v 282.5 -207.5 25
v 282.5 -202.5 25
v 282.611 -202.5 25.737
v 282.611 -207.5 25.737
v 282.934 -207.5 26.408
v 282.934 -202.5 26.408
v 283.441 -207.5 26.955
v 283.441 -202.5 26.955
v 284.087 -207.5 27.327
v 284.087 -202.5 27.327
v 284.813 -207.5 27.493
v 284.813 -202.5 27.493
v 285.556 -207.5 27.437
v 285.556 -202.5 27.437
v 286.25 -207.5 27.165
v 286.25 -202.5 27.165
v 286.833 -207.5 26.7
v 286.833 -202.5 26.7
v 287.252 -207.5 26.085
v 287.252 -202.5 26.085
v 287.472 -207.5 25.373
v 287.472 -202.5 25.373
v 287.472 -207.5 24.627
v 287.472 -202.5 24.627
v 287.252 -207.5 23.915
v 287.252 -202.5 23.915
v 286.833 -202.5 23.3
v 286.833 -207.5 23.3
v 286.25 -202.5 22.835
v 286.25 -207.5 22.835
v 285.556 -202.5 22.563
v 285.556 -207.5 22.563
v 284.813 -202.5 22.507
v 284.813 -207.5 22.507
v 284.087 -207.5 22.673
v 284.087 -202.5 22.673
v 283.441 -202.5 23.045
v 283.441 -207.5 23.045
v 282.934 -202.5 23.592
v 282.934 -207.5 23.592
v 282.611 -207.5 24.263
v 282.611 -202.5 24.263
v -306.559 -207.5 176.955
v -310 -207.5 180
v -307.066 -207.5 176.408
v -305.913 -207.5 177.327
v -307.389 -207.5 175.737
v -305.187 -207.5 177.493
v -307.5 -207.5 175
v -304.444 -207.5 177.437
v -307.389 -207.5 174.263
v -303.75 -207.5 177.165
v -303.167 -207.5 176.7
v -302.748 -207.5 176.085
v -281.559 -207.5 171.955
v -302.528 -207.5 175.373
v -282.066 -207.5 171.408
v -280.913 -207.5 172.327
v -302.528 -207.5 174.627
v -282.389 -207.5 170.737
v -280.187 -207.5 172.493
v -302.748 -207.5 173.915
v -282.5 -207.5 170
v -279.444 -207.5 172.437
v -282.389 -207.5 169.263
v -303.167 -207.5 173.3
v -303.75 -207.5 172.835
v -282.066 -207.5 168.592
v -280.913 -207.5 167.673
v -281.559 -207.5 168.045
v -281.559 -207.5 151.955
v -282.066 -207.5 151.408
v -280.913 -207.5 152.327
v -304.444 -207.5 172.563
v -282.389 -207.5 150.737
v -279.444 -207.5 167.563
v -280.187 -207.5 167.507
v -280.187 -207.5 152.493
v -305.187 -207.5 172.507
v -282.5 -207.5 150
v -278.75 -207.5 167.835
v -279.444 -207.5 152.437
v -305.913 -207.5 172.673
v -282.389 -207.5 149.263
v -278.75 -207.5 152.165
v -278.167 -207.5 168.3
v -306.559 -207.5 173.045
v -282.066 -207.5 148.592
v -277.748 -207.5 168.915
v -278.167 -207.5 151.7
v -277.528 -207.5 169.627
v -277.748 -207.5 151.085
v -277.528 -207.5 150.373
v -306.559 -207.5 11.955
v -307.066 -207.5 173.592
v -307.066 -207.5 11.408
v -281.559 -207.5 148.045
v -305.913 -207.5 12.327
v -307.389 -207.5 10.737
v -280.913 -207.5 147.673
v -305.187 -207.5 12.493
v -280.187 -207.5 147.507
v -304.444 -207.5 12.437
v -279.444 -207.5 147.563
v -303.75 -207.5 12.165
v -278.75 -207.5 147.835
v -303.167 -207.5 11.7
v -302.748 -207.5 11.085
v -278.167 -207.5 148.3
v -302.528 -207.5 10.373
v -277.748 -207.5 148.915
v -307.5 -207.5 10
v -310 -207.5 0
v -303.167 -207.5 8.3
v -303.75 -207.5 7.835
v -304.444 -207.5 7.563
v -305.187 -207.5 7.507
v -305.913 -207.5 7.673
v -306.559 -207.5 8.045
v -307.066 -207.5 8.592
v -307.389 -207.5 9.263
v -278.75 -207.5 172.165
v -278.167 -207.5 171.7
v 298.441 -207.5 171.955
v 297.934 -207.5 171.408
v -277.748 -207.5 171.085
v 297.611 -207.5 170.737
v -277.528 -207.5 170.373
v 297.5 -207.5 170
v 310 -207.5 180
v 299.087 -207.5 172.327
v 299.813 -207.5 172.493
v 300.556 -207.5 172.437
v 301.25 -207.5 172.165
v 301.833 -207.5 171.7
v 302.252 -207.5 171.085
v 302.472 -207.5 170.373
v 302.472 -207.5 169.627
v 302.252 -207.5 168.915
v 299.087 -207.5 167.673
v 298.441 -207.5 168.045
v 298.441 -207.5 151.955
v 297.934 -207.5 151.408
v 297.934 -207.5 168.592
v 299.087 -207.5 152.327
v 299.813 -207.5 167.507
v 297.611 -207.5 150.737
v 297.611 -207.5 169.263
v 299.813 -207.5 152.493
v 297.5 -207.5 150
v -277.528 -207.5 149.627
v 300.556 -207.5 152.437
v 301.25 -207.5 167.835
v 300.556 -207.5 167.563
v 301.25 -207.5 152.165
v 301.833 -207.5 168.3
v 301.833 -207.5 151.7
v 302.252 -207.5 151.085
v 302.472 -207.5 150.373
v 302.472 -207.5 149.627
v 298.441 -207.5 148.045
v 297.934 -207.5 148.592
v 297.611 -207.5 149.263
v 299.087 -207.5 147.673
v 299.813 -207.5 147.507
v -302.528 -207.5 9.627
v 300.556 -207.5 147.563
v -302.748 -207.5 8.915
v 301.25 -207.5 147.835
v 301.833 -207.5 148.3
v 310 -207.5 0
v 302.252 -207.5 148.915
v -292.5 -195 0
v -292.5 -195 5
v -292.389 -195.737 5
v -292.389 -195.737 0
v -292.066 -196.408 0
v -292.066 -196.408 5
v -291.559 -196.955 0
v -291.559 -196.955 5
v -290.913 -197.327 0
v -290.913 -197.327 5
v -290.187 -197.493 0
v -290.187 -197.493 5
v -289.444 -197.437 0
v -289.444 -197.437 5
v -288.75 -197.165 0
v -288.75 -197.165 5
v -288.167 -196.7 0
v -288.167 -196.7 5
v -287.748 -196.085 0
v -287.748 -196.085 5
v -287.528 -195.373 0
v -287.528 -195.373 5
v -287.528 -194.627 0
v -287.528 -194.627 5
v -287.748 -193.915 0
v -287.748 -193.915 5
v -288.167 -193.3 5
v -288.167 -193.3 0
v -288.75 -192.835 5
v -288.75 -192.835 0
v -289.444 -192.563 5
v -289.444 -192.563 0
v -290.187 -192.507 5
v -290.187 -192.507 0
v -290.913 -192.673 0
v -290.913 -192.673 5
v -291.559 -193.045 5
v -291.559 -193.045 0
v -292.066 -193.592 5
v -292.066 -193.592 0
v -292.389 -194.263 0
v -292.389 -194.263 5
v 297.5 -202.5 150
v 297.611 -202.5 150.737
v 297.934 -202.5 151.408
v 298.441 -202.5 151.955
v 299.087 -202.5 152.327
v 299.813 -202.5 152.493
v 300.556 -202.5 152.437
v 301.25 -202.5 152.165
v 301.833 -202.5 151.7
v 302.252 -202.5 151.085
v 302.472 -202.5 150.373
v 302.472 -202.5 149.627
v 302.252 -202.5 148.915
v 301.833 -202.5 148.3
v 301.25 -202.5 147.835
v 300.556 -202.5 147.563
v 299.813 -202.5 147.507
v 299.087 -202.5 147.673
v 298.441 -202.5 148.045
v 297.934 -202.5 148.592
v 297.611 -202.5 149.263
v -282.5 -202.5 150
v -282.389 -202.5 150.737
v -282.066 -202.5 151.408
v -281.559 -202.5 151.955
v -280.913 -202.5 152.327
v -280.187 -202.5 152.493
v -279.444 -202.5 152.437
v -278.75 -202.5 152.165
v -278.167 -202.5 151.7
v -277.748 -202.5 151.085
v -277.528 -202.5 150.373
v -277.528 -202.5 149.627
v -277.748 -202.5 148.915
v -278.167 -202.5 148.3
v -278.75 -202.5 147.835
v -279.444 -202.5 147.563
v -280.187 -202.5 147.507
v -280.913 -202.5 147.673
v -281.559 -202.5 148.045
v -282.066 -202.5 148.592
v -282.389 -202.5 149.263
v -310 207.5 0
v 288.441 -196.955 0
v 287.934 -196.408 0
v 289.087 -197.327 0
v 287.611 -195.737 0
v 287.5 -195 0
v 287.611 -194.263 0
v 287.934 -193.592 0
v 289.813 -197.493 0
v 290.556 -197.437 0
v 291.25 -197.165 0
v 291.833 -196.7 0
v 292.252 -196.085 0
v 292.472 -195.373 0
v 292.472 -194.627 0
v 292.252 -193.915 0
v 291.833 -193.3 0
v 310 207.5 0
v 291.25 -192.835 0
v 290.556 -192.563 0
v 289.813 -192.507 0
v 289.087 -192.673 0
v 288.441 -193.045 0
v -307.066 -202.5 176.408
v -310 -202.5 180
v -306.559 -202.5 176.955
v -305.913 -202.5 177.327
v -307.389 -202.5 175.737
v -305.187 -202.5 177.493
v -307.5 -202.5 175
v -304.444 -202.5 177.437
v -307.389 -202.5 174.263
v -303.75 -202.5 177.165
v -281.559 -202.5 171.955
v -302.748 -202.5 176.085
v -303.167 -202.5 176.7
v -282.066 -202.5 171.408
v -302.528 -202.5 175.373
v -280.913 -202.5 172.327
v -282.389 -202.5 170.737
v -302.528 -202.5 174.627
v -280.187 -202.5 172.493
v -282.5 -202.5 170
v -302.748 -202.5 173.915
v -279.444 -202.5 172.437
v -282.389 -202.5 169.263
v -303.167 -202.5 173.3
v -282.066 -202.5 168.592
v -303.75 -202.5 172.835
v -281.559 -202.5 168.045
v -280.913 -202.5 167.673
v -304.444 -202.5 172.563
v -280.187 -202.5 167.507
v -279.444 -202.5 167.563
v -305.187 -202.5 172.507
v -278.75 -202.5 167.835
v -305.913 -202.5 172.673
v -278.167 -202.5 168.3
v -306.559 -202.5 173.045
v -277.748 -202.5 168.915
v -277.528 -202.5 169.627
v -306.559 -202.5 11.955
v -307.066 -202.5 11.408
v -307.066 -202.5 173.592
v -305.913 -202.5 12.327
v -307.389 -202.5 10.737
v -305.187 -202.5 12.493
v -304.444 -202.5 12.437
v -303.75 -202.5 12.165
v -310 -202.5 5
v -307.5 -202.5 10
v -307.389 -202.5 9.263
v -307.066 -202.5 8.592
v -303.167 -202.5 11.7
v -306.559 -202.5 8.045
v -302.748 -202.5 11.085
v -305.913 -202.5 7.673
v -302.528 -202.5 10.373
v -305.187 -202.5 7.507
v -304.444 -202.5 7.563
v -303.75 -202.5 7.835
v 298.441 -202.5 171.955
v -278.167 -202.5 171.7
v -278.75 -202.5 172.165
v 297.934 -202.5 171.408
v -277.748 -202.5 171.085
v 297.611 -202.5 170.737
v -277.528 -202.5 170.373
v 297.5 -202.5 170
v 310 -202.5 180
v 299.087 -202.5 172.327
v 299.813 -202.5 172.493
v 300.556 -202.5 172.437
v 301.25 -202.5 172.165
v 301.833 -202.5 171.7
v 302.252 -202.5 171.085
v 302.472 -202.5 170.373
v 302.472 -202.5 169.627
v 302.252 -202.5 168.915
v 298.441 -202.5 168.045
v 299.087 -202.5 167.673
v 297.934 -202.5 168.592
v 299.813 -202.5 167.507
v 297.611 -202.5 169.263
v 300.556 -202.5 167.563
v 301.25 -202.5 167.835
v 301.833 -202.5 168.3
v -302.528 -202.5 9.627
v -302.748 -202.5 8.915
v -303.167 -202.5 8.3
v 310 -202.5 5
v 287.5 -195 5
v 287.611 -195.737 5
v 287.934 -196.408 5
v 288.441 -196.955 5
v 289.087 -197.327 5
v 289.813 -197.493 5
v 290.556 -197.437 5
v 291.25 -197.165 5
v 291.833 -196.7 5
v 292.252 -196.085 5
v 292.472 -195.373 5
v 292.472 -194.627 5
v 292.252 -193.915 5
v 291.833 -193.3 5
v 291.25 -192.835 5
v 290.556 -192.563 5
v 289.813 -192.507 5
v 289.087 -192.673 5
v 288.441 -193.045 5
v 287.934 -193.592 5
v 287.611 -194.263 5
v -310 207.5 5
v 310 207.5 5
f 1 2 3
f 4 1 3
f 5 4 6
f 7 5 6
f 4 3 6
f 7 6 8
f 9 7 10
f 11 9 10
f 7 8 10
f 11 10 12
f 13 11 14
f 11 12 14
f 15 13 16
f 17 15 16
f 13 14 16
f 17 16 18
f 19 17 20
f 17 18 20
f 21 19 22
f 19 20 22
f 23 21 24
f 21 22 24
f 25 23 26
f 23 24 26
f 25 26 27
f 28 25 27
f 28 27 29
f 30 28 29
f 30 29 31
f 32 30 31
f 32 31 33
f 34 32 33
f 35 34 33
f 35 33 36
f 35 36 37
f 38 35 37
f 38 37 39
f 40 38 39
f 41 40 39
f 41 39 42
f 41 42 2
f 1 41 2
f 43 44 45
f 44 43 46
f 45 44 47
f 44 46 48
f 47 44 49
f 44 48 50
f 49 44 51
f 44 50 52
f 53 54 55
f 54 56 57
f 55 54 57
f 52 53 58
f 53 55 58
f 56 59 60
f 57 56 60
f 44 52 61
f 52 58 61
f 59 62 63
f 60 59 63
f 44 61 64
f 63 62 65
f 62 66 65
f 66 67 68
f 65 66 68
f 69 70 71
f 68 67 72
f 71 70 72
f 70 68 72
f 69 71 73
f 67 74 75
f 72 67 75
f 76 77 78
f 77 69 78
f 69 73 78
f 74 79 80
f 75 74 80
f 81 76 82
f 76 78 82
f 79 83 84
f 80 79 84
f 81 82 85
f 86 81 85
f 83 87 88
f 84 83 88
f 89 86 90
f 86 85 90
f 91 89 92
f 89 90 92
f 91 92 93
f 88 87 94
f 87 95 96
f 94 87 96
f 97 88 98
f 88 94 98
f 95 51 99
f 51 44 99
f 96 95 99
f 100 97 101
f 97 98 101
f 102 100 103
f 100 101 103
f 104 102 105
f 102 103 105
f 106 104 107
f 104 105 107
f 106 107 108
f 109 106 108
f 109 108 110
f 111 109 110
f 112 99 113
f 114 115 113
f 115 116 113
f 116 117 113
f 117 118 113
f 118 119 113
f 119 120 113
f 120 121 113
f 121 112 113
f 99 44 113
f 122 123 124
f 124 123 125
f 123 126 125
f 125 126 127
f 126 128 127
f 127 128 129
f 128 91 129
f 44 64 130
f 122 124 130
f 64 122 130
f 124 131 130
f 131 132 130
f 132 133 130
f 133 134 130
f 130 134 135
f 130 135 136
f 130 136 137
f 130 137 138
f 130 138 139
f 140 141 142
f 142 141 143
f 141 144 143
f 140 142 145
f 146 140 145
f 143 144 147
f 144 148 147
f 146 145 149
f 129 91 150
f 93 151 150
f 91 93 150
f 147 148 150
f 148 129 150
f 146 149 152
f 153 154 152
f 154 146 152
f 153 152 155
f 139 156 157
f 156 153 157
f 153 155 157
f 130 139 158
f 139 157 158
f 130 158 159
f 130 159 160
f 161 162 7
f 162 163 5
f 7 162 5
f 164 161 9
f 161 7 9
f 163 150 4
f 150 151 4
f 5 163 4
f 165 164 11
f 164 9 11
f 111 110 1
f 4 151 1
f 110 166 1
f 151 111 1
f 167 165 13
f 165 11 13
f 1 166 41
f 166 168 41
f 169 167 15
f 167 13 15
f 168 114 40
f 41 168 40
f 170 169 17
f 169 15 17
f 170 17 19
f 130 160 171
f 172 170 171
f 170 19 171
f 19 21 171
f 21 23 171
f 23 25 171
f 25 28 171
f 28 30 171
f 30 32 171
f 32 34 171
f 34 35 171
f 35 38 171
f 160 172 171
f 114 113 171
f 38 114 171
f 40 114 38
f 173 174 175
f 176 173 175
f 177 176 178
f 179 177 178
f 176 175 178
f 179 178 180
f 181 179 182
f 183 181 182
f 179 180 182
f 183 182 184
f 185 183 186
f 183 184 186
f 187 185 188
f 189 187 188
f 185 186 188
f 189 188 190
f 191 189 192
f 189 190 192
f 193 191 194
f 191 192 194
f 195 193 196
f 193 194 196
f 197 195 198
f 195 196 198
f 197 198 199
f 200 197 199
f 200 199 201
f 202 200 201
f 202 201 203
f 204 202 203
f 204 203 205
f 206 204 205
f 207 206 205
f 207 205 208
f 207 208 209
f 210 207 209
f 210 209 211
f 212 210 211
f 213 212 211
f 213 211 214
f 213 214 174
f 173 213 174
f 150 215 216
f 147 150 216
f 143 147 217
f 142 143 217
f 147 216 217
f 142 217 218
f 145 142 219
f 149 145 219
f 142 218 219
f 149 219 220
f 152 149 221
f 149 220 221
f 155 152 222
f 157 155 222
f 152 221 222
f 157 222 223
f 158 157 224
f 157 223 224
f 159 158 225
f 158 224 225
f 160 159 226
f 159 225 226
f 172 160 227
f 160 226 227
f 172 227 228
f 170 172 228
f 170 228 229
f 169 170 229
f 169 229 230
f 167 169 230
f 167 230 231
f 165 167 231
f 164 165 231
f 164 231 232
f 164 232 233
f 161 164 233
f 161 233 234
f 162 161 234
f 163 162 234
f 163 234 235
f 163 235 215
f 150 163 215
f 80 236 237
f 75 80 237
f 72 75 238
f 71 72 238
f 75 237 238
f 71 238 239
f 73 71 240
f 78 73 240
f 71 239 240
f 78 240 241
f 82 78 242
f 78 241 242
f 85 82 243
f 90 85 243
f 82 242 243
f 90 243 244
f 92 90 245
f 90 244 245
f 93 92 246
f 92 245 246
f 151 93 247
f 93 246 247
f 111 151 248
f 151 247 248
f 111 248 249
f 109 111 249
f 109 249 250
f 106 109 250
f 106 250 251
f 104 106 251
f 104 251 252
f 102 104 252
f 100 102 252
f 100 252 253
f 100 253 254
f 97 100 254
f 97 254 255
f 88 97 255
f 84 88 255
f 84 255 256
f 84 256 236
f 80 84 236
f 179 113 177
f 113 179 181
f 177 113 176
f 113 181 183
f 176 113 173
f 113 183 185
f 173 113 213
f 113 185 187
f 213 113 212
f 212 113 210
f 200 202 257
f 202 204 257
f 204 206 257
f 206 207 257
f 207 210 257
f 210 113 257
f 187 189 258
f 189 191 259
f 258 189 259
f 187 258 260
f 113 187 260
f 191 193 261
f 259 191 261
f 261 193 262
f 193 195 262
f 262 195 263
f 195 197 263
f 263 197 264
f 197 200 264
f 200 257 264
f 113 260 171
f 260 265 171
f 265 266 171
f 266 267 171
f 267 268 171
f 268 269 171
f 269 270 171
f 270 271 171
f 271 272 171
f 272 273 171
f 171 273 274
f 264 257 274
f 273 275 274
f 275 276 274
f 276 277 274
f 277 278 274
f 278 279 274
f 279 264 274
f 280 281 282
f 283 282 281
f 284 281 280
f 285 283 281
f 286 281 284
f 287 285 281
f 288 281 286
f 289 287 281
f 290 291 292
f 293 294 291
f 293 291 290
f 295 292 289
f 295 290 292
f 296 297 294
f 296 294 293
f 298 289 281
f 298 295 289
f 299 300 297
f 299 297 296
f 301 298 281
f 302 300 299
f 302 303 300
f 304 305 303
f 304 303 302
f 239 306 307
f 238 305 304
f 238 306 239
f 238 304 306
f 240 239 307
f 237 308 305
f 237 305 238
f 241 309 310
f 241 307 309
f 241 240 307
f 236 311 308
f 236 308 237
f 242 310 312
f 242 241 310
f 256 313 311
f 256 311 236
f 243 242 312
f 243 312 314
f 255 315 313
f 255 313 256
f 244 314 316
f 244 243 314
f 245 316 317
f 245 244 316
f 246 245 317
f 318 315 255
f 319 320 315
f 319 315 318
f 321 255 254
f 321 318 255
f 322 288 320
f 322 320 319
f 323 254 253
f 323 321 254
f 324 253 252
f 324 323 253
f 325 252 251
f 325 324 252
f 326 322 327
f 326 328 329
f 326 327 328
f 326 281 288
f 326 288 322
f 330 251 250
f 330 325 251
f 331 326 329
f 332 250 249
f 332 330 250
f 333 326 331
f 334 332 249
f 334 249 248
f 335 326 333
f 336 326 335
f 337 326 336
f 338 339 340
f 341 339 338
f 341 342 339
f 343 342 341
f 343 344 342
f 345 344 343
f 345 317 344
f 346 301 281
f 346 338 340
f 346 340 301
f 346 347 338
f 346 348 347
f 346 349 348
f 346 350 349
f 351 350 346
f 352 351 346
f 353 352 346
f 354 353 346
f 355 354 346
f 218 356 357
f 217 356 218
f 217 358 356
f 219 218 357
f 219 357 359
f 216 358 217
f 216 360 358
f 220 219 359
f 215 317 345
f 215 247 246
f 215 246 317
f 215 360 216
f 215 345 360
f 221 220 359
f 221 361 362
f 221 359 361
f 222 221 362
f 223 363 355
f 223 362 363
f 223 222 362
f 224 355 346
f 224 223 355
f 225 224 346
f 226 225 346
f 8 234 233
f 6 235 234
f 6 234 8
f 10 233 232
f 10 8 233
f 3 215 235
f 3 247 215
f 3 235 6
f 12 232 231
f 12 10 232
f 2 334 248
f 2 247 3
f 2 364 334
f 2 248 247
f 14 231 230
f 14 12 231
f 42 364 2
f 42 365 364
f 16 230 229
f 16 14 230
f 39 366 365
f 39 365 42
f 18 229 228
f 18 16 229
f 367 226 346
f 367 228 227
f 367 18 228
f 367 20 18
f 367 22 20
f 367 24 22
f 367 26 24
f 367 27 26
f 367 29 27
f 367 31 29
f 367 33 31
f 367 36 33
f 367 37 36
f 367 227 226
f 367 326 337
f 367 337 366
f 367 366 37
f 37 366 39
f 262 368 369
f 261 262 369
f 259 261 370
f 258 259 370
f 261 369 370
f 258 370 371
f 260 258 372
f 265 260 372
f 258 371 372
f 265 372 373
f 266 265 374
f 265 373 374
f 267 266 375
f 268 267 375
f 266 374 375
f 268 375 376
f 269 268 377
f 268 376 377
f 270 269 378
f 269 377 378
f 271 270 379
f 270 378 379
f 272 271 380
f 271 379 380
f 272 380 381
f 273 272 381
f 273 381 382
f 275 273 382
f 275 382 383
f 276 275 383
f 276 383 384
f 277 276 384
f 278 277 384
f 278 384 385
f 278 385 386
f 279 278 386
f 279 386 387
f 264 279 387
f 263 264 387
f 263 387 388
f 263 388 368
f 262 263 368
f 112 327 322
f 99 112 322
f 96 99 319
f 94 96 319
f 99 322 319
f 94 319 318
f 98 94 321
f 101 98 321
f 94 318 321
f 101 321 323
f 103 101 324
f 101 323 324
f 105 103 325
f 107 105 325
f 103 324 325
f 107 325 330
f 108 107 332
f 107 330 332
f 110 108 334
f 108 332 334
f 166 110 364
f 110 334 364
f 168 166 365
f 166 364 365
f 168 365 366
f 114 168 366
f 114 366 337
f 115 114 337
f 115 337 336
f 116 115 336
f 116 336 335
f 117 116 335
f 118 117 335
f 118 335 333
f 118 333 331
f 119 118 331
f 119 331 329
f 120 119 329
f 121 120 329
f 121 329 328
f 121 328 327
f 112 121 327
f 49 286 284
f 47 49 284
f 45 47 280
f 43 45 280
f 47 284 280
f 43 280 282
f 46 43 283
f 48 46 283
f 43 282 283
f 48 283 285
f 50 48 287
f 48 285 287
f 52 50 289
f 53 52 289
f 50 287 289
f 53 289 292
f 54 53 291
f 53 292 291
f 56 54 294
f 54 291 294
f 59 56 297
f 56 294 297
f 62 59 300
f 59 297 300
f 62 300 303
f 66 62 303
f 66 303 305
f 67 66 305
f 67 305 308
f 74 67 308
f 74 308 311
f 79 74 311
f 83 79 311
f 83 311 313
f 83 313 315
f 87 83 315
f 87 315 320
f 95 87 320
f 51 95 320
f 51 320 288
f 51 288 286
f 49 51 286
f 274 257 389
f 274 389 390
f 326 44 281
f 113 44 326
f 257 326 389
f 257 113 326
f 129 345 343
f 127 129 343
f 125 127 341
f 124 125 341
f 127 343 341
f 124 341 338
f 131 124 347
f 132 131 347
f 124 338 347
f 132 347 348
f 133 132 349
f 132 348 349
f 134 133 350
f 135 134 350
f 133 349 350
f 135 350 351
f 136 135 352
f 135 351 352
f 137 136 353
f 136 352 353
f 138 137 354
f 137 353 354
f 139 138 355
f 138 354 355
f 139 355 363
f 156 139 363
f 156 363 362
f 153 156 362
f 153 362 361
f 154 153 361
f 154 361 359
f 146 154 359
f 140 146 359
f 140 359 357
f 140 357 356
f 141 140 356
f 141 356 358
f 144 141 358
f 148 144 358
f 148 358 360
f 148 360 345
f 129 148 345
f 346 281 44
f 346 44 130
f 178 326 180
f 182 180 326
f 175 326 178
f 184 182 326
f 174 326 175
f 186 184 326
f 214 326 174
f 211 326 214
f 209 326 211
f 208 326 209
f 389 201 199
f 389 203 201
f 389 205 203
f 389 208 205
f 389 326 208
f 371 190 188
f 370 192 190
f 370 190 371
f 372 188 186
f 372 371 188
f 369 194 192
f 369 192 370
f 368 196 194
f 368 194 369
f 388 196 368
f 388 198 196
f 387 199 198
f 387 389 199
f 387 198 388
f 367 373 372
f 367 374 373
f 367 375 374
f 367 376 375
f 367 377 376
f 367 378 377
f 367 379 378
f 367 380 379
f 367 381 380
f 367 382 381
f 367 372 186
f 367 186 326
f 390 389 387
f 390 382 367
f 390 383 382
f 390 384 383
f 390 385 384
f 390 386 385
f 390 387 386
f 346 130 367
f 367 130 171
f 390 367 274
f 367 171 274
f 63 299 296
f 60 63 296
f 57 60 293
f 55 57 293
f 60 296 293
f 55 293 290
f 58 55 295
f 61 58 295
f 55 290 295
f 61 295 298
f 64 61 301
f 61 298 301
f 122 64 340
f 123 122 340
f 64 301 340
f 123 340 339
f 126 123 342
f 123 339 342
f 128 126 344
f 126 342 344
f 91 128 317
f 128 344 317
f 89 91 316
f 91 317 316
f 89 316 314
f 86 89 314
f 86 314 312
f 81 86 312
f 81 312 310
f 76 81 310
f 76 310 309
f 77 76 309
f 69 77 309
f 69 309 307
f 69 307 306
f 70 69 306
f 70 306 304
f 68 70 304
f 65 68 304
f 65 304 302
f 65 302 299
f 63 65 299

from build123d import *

# Parameters (mm, degrees)
F0_W      = 620
F0_H      = 415
F1_DEPTH  = 5
F2_W      = 620
F2_H      = 5
F3_DEPTH  = 175
F5_D      = 5
F7_D      = 5
F9_D      = 5
F11_D     = 5
F13_D     = 5
F15_D     = 5
F17_D     = 5
F19_D     = 5
F21_D     = 5
F21_DEPTH = 11


with BuildPart() as f1:
    # F0 (on Top) → F1 (new body)
    with BuildSketch(Plane.XY):
        Rectangle(F0_W, F0_H)
    extrude(amount=F1_DEPTH)

    # F2 (on face) → F3 (join)
    with BuildSketch(Plane.XY.offset(5)):
        with Locations((0, -205)):
            Rectangle(F2_W, F2_H)
    extrude(amount=F3_DEPTH)

    # F5 (through all)
    with Locations(Plane.XZ.offset(207.5)):
        with Locations((300, 170)):
            Hole(F5_D / 2)

    # F7 (through all)
    with Locations(Plane.XZ.offset(207.5)):
        with Locations((300, 150)):
            Hole(F7_D / 2)

    # F9 (through all)
    with Locations(Plane.XZ.offset(207.5)):
        with Locations((-280, 170)):
            Hole(F9_D / 2)

    # F11 (through all)
    with Locations(Plane.XZ.offset(207.5)):
        with Locations((-280, 150)):
            Hole(F11_D / 2)

    # F13 (through all)
    with Locations(Plane.XZ.offset(207.5)):
        with Locations((-305, 175)):
            Hole(F13_D / 2)

    # F15 (through all)
    with Locations(Plane.XZ.offset(207.5)):
        with Locations((-305, 10)):
            Hole(F15_D / 2)

    # F17 (through all)
    with Locations(Plane(origin=(0, 0, 0), x_dir=(1, 0, 0), z_dir=(0, 0, -1))):
        with Locations((290, 195)):
            Hole(F17_D / 2)

    # F19 (through all)
    with Locations(Plane(origin=(0, 0, 0), x_dir=(1, 0, 0), z_dir=(0, 0, -1))):
        with Locations((-290, 195)):
            Hole(F19_D / 2)

    # F21
    with Locations(Plane.XZ.offset(207.5)):
        with Locations((285, 25)):
            Hole(F21_D / 2, depth=F21_DEPTH)


solid = f1.part
